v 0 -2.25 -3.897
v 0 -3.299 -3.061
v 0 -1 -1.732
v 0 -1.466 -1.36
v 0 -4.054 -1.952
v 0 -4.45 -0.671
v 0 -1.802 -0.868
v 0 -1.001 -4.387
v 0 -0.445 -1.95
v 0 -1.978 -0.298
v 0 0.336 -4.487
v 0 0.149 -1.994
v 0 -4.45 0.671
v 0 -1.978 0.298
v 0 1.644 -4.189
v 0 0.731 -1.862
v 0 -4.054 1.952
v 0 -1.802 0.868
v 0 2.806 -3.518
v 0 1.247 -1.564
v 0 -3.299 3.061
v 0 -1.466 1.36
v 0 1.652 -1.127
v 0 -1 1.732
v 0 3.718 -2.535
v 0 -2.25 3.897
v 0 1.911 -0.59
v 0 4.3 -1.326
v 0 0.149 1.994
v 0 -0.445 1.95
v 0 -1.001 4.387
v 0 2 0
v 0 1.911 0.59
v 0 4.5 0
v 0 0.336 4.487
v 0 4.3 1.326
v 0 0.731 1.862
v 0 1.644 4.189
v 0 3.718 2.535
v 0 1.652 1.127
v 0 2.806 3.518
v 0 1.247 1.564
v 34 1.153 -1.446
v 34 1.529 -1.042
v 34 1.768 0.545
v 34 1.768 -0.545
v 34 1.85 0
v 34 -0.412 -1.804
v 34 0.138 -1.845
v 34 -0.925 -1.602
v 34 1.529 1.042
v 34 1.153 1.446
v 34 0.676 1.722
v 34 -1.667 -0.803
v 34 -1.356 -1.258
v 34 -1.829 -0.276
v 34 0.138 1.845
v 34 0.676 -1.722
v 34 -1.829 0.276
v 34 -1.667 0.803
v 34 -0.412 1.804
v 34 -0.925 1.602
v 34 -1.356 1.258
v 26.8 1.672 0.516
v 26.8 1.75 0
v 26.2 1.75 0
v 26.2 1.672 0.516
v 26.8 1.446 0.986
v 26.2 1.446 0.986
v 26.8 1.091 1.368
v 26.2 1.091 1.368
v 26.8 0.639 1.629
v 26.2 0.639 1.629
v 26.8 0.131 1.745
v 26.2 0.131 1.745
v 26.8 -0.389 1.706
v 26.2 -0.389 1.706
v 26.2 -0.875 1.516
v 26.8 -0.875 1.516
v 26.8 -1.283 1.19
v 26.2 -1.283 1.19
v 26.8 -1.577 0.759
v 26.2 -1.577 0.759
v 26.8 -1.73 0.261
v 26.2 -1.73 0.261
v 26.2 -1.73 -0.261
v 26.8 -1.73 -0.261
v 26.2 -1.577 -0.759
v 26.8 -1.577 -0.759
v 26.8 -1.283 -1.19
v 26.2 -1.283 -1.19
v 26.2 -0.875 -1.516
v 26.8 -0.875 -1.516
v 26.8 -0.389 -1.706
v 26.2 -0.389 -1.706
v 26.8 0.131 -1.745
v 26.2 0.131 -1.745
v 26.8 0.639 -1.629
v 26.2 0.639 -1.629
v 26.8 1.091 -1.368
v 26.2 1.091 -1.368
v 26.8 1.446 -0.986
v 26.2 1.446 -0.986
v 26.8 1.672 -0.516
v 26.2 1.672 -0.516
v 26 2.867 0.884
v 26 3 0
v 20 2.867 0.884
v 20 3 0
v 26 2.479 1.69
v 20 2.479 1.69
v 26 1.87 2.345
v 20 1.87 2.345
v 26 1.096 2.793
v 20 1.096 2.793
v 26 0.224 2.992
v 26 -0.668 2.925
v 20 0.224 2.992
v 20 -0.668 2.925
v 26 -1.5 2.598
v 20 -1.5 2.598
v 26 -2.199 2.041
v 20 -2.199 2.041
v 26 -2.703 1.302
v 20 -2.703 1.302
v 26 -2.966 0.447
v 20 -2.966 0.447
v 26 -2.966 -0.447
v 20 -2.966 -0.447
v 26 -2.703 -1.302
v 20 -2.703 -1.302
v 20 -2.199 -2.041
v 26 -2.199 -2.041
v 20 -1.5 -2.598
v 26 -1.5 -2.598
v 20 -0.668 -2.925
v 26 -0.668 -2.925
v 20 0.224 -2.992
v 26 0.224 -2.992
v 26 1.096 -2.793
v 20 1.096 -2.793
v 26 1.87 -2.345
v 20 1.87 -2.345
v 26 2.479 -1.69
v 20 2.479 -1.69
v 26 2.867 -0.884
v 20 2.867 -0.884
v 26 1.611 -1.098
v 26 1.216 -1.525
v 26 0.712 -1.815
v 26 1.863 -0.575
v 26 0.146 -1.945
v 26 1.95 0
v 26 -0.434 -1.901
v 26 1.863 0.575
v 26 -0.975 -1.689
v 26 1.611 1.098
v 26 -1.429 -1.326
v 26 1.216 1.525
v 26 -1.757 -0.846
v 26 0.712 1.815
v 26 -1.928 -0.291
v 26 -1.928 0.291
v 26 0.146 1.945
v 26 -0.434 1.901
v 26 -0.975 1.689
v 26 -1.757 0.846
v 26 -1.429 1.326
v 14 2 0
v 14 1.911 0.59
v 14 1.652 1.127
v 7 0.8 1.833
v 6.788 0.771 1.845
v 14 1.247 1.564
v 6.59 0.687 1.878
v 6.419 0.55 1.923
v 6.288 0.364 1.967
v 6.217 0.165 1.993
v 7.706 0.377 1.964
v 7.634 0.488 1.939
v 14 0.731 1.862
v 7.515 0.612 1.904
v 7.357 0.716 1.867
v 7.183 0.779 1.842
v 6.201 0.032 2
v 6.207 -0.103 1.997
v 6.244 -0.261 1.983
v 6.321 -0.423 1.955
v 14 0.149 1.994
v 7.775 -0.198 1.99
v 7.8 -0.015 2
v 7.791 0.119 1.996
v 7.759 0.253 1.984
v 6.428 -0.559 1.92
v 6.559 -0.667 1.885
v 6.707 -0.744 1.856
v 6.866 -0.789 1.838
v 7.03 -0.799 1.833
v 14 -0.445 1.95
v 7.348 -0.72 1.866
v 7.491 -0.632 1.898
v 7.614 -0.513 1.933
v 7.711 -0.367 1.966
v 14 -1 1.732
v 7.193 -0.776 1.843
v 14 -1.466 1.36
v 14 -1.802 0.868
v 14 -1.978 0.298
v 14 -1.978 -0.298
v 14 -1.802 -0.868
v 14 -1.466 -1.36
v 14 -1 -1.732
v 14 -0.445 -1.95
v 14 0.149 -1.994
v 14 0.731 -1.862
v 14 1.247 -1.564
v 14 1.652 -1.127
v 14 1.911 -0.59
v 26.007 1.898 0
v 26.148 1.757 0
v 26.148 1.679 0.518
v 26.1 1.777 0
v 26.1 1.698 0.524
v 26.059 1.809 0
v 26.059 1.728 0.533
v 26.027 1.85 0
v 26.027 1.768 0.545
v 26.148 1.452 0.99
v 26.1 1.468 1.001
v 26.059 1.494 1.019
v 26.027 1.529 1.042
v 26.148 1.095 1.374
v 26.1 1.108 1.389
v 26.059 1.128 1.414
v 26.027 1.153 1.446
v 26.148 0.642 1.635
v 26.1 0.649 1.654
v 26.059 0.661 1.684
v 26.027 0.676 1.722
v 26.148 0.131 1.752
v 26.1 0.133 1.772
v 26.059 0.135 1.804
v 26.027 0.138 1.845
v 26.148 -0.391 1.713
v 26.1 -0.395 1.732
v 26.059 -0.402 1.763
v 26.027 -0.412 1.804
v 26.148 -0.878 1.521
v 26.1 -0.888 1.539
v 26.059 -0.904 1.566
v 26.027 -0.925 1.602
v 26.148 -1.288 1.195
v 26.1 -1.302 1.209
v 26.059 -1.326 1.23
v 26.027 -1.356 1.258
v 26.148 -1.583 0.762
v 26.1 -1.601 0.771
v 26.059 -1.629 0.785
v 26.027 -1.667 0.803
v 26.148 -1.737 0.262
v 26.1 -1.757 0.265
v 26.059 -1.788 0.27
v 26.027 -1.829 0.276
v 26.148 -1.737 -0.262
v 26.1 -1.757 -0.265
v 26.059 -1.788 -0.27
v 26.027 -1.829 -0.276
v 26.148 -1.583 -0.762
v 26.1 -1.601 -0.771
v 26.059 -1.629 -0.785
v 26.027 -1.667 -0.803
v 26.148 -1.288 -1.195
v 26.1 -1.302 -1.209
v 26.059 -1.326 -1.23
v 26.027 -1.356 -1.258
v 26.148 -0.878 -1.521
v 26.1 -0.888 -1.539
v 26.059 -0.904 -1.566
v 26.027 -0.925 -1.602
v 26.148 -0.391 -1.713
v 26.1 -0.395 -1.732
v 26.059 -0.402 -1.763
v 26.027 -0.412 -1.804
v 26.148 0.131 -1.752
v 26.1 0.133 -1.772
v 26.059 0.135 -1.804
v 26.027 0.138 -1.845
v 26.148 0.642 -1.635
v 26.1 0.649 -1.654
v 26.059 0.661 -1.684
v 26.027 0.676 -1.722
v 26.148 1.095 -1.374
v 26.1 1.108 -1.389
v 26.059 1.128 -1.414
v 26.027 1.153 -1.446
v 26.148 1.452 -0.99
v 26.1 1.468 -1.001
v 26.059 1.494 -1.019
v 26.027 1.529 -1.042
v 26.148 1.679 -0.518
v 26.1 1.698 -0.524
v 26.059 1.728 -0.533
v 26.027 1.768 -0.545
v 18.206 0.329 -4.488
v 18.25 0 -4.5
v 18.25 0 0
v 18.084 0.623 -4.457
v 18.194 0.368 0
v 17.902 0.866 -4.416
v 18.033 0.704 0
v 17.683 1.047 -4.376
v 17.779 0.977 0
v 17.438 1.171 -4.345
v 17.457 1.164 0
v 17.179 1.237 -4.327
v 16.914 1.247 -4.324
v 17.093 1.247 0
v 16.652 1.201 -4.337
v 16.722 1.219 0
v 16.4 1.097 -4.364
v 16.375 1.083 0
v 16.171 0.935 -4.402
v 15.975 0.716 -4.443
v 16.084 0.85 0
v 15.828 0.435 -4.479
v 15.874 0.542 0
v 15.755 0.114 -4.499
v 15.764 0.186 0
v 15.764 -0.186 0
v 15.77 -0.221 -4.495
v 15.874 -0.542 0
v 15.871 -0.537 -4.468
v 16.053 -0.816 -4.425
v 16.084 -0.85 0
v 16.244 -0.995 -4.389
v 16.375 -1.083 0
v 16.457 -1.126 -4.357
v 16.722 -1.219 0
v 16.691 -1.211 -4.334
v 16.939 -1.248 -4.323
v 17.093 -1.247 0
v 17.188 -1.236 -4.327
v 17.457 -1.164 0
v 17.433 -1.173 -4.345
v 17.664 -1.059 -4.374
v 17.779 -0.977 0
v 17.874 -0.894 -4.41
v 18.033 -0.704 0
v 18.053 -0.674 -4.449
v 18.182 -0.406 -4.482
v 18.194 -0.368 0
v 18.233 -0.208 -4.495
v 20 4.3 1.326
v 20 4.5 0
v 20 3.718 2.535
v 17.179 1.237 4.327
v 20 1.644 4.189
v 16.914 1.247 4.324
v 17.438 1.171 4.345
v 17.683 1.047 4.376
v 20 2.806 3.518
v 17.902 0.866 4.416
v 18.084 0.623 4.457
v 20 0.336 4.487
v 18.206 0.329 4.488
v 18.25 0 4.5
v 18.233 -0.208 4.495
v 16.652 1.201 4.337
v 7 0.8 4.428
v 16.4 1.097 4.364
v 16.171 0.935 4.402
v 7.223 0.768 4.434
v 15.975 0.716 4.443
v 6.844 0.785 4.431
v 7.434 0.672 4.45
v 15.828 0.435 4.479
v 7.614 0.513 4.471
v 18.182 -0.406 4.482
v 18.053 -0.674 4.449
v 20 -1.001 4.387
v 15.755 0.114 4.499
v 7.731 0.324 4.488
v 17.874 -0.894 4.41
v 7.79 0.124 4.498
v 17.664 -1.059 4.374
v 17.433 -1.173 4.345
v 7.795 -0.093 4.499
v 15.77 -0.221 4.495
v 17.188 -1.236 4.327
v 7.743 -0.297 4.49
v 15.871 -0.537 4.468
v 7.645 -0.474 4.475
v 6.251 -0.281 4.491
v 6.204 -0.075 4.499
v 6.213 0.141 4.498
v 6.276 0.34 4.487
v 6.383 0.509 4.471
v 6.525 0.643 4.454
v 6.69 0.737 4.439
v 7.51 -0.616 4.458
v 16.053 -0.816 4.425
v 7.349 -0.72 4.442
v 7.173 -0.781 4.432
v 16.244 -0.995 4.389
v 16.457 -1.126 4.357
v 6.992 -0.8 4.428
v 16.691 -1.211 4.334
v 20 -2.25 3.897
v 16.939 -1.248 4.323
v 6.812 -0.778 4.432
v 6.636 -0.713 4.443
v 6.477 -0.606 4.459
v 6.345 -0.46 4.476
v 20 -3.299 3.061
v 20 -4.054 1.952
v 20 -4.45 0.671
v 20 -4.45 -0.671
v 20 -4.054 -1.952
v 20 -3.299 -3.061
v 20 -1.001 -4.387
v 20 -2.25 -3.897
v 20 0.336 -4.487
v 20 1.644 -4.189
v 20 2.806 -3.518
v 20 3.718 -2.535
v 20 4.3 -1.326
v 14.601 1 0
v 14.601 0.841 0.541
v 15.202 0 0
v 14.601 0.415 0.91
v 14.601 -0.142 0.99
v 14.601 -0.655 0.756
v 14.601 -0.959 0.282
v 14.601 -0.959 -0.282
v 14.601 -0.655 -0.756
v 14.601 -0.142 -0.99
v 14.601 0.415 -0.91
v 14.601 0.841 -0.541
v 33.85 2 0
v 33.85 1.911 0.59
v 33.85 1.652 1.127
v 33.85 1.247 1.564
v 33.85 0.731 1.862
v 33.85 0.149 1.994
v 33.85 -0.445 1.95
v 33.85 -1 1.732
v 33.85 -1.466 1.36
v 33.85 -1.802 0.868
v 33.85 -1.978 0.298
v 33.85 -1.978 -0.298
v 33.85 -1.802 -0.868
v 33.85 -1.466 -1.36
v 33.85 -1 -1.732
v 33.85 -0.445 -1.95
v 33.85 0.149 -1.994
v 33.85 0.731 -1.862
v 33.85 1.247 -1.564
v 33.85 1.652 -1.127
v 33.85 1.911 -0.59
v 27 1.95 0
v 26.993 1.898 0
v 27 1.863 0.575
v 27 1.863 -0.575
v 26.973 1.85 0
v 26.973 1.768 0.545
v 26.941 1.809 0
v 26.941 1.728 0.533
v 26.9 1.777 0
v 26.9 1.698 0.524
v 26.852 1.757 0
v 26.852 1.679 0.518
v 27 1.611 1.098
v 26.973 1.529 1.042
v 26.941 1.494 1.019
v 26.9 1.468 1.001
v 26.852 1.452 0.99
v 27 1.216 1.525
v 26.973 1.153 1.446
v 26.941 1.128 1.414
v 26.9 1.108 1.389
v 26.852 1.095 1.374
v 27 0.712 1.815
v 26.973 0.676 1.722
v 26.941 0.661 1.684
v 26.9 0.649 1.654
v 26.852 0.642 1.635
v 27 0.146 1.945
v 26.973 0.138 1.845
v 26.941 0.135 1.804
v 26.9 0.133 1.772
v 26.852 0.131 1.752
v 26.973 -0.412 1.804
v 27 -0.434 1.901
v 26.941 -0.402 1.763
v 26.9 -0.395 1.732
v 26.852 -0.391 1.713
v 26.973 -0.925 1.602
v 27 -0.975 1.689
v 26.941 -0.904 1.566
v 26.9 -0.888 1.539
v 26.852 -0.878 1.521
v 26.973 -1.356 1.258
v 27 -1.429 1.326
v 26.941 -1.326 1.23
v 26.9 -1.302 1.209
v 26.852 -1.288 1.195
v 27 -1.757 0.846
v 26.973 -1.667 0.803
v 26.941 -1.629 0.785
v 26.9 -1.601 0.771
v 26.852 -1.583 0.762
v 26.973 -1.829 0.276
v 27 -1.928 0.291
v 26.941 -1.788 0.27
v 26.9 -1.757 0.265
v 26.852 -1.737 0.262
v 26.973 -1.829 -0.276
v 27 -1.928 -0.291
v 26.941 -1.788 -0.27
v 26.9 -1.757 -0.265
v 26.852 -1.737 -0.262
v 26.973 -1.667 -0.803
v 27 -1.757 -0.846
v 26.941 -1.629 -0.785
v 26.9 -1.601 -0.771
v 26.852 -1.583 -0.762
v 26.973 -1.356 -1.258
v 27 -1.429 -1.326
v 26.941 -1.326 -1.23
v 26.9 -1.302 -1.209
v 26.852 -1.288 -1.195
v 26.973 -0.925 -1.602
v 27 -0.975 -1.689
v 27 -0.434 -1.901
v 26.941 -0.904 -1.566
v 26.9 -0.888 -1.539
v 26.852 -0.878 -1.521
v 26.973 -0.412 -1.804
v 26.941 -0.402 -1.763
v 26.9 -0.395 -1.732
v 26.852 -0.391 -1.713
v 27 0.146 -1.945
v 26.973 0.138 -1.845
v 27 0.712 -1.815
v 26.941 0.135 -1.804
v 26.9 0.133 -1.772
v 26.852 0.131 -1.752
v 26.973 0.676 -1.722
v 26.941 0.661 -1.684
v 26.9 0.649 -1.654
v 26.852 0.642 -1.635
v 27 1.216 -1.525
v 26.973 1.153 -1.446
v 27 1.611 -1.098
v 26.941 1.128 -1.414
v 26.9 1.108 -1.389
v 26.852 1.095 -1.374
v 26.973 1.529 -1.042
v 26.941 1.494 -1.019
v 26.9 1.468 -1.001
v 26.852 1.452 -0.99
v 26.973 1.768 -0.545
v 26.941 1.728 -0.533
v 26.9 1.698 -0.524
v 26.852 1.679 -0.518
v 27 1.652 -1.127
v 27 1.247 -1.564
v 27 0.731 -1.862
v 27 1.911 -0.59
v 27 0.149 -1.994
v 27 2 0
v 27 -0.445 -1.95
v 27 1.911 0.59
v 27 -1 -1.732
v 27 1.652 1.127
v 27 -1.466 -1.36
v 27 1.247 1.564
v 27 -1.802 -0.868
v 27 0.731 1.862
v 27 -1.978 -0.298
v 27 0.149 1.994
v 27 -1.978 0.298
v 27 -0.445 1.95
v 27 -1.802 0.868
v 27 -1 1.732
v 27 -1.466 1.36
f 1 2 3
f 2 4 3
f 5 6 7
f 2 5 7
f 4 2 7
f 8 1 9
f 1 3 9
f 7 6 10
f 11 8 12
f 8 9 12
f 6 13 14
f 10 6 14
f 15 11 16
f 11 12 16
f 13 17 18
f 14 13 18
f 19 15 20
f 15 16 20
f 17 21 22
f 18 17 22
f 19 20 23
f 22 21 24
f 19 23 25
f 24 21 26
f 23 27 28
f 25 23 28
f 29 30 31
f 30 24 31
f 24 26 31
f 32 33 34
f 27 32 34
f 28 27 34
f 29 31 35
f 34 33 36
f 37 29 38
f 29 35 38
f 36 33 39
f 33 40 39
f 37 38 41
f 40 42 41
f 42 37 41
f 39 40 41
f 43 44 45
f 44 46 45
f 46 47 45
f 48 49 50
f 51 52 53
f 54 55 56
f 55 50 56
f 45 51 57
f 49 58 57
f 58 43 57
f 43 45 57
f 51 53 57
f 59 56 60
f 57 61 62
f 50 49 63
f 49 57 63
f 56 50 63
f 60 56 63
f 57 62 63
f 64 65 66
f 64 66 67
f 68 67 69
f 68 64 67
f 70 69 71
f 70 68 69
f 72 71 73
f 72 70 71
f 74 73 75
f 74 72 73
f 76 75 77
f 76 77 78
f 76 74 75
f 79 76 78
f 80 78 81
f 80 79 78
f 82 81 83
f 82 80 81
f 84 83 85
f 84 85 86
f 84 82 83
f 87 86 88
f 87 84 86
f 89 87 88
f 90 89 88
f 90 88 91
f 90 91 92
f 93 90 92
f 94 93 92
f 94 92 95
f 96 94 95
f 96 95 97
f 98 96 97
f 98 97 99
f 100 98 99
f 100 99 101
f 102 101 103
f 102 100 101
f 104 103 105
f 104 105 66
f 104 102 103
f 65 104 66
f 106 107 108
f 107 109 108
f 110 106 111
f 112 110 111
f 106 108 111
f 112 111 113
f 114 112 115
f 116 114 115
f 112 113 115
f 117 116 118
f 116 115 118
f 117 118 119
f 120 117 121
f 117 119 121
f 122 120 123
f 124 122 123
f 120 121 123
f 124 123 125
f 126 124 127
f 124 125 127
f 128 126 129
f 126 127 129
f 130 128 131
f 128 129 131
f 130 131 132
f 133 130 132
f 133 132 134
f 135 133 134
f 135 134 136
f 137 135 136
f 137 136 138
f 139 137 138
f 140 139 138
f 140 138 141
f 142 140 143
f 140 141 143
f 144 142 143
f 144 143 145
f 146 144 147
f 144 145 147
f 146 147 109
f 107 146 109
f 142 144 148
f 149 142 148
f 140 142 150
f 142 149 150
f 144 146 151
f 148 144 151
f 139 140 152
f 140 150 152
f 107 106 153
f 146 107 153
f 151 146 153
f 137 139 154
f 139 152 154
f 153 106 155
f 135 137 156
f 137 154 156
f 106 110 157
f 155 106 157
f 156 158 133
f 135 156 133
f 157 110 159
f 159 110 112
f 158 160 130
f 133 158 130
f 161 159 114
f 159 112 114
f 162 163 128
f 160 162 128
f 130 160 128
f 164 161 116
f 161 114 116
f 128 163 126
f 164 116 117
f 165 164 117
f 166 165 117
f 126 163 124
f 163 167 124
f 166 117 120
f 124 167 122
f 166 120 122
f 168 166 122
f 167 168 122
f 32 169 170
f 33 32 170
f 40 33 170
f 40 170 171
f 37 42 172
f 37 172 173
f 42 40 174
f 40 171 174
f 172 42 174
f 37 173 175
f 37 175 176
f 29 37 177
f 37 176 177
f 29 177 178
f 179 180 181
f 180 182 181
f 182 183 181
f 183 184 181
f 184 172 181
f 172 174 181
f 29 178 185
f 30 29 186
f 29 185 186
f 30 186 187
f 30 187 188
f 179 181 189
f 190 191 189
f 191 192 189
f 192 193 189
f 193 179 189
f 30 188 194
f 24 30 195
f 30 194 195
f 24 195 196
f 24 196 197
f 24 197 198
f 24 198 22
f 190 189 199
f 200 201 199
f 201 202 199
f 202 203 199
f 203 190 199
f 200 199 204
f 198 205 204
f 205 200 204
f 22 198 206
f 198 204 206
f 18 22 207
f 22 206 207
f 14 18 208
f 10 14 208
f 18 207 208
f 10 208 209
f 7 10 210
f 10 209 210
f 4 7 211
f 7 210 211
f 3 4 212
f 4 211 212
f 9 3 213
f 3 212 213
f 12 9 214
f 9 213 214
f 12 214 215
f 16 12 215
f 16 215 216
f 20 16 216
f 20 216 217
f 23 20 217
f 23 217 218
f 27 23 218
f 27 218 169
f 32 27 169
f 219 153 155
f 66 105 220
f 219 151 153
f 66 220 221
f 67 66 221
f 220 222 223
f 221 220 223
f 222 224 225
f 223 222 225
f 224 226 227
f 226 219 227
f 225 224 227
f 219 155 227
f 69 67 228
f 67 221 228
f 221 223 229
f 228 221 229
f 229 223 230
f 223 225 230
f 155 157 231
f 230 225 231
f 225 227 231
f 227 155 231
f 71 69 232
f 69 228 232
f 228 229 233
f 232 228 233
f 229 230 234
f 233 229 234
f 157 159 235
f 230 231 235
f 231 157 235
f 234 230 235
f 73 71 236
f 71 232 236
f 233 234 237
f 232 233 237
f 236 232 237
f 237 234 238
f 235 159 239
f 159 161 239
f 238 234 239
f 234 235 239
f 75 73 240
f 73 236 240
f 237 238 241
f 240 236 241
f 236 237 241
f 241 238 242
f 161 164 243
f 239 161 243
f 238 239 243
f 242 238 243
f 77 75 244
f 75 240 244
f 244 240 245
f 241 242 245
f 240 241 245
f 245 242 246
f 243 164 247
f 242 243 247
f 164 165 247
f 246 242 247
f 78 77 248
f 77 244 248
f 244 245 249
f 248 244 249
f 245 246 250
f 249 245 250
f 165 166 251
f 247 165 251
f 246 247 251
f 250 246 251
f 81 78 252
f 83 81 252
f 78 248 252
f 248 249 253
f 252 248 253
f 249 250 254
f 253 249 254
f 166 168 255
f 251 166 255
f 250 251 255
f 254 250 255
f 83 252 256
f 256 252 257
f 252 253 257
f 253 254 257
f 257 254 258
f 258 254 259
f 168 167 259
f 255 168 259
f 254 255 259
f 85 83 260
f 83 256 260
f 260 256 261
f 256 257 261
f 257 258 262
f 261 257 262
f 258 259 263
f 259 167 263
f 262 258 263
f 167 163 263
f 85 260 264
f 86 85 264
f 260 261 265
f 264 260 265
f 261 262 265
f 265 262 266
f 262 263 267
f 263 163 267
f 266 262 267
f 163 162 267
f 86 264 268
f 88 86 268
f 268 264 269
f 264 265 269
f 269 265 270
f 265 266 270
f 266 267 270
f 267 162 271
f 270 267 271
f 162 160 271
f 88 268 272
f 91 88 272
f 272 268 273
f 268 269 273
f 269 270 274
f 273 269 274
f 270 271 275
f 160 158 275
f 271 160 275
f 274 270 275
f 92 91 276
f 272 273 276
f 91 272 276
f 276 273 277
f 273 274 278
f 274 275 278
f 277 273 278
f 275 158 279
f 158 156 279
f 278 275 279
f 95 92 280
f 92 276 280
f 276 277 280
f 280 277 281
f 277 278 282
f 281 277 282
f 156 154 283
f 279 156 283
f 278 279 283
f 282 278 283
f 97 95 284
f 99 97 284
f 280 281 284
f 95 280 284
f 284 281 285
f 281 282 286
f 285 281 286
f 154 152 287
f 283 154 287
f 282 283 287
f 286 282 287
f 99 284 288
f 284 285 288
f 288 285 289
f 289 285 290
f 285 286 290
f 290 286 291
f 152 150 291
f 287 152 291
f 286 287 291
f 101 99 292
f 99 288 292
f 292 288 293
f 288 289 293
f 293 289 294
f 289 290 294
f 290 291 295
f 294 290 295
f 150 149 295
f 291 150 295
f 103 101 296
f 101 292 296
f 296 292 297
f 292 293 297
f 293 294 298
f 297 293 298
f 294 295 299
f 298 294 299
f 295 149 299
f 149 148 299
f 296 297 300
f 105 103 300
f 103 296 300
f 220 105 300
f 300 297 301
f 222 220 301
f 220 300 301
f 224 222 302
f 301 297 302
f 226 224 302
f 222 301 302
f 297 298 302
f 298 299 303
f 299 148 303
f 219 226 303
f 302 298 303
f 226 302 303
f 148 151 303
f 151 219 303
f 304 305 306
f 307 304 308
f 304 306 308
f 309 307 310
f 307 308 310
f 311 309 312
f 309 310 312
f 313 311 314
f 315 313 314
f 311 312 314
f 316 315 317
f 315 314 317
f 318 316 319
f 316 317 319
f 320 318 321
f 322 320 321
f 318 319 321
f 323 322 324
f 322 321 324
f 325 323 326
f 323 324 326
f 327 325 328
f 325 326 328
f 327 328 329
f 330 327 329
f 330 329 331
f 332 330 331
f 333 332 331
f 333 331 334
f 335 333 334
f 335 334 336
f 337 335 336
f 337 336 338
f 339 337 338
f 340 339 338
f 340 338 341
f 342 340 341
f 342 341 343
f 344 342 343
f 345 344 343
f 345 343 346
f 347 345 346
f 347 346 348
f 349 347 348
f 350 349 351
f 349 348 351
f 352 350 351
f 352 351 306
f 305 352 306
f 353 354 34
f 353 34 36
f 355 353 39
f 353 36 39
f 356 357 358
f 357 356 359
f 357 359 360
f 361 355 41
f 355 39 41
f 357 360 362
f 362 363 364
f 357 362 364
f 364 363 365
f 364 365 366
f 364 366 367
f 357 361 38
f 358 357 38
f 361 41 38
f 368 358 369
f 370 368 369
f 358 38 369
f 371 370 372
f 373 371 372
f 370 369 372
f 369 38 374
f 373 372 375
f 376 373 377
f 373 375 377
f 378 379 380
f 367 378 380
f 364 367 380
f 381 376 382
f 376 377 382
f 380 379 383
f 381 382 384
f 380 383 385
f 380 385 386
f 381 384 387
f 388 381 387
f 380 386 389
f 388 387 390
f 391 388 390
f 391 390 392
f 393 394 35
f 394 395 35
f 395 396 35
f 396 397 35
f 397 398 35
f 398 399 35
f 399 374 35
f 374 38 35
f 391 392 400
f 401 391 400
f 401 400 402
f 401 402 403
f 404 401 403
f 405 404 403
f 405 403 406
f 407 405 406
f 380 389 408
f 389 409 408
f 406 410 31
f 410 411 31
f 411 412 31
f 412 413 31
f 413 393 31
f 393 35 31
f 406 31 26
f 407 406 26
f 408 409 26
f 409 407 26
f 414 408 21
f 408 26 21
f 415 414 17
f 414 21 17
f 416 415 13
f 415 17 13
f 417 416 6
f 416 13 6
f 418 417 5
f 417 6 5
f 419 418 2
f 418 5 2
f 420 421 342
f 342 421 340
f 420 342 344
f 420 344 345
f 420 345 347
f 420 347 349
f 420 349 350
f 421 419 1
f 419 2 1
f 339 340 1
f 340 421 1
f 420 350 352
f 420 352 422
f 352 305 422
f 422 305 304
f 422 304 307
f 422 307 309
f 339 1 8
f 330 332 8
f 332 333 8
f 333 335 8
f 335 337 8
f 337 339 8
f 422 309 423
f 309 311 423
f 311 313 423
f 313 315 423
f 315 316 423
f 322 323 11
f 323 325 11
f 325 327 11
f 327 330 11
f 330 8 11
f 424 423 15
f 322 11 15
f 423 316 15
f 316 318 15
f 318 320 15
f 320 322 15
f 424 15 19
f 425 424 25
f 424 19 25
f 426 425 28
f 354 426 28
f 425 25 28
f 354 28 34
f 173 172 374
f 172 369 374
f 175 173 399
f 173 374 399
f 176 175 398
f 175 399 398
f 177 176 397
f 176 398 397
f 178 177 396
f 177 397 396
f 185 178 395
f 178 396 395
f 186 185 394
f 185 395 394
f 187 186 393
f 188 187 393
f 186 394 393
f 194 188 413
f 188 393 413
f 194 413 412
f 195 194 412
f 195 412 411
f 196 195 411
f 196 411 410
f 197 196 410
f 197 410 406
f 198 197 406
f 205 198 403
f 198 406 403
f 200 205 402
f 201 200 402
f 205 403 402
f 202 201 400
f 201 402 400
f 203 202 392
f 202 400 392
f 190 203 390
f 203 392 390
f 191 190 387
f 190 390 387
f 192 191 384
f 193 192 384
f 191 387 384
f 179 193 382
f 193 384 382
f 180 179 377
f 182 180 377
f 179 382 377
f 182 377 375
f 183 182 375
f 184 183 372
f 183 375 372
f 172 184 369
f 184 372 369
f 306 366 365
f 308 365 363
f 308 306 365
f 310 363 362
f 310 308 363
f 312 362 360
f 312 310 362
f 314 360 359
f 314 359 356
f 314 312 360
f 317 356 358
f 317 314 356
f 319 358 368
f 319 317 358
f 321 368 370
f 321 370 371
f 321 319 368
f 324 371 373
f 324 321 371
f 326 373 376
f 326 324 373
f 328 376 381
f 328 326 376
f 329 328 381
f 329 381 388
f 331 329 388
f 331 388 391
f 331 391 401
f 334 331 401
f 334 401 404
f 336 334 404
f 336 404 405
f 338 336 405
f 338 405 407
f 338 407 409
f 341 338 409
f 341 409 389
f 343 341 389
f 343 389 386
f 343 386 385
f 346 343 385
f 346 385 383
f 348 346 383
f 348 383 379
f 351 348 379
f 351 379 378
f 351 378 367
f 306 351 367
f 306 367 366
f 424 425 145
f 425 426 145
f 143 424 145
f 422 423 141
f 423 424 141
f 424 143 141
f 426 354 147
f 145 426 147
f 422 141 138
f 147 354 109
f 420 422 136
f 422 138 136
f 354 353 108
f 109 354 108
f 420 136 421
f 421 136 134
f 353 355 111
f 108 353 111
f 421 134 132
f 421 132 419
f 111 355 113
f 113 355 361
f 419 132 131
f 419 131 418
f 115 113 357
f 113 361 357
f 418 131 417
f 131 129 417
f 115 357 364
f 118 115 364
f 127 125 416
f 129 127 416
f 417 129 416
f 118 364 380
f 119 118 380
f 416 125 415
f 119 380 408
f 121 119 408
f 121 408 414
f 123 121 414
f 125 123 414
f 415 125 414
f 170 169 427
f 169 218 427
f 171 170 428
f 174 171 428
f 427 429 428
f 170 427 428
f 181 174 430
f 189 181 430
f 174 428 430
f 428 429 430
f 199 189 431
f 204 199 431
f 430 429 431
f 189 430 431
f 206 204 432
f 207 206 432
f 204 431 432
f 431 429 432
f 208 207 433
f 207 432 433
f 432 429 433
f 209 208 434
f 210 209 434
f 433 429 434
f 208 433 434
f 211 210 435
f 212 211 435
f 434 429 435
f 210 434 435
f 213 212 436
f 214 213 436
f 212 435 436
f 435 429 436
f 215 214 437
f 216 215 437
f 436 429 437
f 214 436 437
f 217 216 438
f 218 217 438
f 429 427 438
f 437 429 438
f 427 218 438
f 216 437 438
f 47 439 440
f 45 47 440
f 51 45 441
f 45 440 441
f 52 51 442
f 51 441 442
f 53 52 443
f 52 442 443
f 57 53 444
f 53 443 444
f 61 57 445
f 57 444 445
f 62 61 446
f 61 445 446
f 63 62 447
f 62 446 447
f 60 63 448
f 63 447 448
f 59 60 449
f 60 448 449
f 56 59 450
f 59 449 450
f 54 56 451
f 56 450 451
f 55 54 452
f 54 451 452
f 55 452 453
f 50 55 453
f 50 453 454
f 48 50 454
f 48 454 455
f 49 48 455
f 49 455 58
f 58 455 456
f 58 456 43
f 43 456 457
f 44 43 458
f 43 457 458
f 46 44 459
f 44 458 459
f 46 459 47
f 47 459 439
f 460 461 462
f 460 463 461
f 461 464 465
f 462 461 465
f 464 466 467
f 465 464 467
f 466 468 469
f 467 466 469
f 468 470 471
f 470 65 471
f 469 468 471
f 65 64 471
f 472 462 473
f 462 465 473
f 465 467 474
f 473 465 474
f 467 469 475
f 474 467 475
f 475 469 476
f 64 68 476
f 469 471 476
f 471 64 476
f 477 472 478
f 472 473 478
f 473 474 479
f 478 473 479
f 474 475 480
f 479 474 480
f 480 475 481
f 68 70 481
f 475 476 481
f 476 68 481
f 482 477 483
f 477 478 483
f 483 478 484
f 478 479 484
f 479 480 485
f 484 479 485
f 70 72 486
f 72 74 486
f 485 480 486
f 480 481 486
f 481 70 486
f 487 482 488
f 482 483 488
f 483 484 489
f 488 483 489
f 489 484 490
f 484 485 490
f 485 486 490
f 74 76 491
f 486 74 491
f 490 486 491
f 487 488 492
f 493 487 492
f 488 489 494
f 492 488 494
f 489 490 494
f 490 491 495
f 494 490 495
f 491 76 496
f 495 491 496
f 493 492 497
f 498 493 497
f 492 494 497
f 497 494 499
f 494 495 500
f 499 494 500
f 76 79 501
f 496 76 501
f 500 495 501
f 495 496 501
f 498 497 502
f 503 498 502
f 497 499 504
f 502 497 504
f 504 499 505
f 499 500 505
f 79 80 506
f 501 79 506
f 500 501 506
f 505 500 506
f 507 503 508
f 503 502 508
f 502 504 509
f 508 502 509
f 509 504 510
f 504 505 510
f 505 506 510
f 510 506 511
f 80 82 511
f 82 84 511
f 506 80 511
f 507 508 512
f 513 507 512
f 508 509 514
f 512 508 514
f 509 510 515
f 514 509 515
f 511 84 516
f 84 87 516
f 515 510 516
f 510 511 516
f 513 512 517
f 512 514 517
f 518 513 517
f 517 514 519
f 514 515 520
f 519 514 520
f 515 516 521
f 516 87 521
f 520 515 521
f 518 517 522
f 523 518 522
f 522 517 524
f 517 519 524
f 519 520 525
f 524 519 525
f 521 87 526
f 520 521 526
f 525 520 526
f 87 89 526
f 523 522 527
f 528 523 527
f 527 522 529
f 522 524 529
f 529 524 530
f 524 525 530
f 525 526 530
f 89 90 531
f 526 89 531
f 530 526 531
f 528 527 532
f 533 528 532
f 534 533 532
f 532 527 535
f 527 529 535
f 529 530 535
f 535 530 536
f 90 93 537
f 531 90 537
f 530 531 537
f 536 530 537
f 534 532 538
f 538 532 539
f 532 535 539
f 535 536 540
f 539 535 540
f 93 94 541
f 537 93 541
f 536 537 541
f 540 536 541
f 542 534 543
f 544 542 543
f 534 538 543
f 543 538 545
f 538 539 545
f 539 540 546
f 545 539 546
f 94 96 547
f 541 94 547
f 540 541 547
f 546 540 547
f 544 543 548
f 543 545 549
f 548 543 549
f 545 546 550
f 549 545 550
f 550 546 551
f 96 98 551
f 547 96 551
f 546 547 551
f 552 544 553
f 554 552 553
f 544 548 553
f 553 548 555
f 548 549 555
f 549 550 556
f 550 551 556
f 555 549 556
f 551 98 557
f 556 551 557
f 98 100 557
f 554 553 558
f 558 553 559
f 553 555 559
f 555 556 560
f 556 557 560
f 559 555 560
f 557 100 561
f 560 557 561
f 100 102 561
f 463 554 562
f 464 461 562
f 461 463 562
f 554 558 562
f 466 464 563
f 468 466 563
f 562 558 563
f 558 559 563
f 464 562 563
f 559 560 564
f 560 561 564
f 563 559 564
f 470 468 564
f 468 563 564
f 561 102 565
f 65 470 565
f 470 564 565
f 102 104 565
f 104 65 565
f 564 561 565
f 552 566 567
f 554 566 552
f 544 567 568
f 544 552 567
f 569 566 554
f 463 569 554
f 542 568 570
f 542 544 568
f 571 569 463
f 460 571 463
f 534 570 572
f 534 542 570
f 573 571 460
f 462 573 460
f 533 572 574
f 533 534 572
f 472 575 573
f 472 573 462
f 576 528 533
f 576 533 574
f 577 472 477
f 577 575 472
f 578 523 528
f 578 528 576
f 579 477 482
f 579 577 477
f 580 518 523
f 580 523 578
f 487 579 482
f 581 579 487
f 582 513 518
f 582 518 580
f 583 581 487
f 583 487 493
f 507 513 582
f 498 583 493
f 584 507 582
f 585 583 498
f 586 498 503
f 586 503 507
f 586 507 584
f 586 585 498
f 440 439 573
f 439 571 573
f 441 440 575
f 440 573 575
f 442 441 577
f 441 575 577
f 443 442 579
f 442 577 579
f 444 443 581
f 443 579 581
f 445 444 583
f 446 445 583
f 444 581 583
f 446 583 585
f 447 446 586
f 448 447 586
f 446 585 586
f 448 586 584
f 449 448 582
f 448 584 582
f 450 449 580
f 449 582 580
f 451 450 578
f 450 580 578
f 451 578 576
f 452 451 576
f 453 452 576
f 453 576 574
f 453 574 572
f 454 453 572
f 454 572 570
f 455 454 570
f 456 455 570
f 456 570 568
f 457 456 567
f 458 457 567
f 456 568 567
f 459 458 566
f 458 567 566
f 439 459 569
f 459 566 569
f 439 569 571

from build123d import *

# Parameters (mm, degrees)
FASE1_SIZE                           = 0.15
SKIZZE2_W                            = 1
SKIZZE2_H                            = 0.5
VERRUNDUNG1_R                        = 0.2
SKIZZE5_W                            = 0.8
SKIZZE5_H                            = 4.5
SKIZZE7_R                            = 1.25
SCHNITT_LINEAR_AUSTRAGEN2_DEPTH      = 5.50000011
SCHNITT_LINEAR_AUSTRAGEN2_DEPTH_BACK = 5.5000001


with BuildPart() as part:
    # Skizze1 → Rotation1 (revolve)
    with BuildSketch(Plane.XY):
        Polygon((0, 4.5), (0, 2), (14, 2), (15.201721238, 0), (34, 0), (34, 2), (26, 2), (26, 3), (20, 3), (20, 4.5), align=None)
    revolve(axis=Axis((0, 0, 0), (1, 0, 0)))

    # Fase1
    fase1_edges = [part.edges().sort_by_distance(p)[0] for p in [
        (34, -2, 0),
    ]]
    chamfer(fase1_edges, length=FASE1_SIZE)

    # Skizze2 → Schnitt-Rotation1 (revolve, cut)
    with BuildSketch(Plane.XY):
        with Locations((26.5, 2)):
            Rectangle(SKIZZE2_W, SKIZZE2_H)
    revolve(axis=Axis((0, 0, 0), (1, 0, 0)), mode=Mode.SUBTRACT)

    # Verrundung1
    verrundung1_edges = [part.edges().sort_by_distance(p)[0] for p in [
        (27, -1.75, 0),
        (26, -1.75, 0),
    ]]
    fillet(verrundung1_edges, radius=VERRUNDUNG1_R)

    # Skizze5 → M2 Gewindebohrung1 (revolve, cut)
    with BuildSketch(Plane.YZ.offset(7)):
        with Locations((0.4, 2.25)):
            Rectangle(SKIZZE5_W, SKIZZE5_H)
    revolve(axis=Axis((7, 0, -6.35), (0, 0, 1)), mode=Mode.SUBTRACT)

    # Skizze7 → Schnitt-Linear austragen2 (cut, two sides)
    with BuildSketch(Plane.XY) as schnitt_linear_austragen2_sk:
        with Locations((17, 0)):
            Circle(SKIZZE7_R)
    extrude(amount=SCHNITT_LINEAR_AUSTRAGEN2_DEPTH, mode=Mode.SUBTRACT)
    extrude(schnitt_linear_austragen2_sk.sketch, amount=-SCHNITT_LINEAR_AUSTRAGEN2_DEPTH_BACK, mode=Mode.SUBTRACT)


solid = part.part
